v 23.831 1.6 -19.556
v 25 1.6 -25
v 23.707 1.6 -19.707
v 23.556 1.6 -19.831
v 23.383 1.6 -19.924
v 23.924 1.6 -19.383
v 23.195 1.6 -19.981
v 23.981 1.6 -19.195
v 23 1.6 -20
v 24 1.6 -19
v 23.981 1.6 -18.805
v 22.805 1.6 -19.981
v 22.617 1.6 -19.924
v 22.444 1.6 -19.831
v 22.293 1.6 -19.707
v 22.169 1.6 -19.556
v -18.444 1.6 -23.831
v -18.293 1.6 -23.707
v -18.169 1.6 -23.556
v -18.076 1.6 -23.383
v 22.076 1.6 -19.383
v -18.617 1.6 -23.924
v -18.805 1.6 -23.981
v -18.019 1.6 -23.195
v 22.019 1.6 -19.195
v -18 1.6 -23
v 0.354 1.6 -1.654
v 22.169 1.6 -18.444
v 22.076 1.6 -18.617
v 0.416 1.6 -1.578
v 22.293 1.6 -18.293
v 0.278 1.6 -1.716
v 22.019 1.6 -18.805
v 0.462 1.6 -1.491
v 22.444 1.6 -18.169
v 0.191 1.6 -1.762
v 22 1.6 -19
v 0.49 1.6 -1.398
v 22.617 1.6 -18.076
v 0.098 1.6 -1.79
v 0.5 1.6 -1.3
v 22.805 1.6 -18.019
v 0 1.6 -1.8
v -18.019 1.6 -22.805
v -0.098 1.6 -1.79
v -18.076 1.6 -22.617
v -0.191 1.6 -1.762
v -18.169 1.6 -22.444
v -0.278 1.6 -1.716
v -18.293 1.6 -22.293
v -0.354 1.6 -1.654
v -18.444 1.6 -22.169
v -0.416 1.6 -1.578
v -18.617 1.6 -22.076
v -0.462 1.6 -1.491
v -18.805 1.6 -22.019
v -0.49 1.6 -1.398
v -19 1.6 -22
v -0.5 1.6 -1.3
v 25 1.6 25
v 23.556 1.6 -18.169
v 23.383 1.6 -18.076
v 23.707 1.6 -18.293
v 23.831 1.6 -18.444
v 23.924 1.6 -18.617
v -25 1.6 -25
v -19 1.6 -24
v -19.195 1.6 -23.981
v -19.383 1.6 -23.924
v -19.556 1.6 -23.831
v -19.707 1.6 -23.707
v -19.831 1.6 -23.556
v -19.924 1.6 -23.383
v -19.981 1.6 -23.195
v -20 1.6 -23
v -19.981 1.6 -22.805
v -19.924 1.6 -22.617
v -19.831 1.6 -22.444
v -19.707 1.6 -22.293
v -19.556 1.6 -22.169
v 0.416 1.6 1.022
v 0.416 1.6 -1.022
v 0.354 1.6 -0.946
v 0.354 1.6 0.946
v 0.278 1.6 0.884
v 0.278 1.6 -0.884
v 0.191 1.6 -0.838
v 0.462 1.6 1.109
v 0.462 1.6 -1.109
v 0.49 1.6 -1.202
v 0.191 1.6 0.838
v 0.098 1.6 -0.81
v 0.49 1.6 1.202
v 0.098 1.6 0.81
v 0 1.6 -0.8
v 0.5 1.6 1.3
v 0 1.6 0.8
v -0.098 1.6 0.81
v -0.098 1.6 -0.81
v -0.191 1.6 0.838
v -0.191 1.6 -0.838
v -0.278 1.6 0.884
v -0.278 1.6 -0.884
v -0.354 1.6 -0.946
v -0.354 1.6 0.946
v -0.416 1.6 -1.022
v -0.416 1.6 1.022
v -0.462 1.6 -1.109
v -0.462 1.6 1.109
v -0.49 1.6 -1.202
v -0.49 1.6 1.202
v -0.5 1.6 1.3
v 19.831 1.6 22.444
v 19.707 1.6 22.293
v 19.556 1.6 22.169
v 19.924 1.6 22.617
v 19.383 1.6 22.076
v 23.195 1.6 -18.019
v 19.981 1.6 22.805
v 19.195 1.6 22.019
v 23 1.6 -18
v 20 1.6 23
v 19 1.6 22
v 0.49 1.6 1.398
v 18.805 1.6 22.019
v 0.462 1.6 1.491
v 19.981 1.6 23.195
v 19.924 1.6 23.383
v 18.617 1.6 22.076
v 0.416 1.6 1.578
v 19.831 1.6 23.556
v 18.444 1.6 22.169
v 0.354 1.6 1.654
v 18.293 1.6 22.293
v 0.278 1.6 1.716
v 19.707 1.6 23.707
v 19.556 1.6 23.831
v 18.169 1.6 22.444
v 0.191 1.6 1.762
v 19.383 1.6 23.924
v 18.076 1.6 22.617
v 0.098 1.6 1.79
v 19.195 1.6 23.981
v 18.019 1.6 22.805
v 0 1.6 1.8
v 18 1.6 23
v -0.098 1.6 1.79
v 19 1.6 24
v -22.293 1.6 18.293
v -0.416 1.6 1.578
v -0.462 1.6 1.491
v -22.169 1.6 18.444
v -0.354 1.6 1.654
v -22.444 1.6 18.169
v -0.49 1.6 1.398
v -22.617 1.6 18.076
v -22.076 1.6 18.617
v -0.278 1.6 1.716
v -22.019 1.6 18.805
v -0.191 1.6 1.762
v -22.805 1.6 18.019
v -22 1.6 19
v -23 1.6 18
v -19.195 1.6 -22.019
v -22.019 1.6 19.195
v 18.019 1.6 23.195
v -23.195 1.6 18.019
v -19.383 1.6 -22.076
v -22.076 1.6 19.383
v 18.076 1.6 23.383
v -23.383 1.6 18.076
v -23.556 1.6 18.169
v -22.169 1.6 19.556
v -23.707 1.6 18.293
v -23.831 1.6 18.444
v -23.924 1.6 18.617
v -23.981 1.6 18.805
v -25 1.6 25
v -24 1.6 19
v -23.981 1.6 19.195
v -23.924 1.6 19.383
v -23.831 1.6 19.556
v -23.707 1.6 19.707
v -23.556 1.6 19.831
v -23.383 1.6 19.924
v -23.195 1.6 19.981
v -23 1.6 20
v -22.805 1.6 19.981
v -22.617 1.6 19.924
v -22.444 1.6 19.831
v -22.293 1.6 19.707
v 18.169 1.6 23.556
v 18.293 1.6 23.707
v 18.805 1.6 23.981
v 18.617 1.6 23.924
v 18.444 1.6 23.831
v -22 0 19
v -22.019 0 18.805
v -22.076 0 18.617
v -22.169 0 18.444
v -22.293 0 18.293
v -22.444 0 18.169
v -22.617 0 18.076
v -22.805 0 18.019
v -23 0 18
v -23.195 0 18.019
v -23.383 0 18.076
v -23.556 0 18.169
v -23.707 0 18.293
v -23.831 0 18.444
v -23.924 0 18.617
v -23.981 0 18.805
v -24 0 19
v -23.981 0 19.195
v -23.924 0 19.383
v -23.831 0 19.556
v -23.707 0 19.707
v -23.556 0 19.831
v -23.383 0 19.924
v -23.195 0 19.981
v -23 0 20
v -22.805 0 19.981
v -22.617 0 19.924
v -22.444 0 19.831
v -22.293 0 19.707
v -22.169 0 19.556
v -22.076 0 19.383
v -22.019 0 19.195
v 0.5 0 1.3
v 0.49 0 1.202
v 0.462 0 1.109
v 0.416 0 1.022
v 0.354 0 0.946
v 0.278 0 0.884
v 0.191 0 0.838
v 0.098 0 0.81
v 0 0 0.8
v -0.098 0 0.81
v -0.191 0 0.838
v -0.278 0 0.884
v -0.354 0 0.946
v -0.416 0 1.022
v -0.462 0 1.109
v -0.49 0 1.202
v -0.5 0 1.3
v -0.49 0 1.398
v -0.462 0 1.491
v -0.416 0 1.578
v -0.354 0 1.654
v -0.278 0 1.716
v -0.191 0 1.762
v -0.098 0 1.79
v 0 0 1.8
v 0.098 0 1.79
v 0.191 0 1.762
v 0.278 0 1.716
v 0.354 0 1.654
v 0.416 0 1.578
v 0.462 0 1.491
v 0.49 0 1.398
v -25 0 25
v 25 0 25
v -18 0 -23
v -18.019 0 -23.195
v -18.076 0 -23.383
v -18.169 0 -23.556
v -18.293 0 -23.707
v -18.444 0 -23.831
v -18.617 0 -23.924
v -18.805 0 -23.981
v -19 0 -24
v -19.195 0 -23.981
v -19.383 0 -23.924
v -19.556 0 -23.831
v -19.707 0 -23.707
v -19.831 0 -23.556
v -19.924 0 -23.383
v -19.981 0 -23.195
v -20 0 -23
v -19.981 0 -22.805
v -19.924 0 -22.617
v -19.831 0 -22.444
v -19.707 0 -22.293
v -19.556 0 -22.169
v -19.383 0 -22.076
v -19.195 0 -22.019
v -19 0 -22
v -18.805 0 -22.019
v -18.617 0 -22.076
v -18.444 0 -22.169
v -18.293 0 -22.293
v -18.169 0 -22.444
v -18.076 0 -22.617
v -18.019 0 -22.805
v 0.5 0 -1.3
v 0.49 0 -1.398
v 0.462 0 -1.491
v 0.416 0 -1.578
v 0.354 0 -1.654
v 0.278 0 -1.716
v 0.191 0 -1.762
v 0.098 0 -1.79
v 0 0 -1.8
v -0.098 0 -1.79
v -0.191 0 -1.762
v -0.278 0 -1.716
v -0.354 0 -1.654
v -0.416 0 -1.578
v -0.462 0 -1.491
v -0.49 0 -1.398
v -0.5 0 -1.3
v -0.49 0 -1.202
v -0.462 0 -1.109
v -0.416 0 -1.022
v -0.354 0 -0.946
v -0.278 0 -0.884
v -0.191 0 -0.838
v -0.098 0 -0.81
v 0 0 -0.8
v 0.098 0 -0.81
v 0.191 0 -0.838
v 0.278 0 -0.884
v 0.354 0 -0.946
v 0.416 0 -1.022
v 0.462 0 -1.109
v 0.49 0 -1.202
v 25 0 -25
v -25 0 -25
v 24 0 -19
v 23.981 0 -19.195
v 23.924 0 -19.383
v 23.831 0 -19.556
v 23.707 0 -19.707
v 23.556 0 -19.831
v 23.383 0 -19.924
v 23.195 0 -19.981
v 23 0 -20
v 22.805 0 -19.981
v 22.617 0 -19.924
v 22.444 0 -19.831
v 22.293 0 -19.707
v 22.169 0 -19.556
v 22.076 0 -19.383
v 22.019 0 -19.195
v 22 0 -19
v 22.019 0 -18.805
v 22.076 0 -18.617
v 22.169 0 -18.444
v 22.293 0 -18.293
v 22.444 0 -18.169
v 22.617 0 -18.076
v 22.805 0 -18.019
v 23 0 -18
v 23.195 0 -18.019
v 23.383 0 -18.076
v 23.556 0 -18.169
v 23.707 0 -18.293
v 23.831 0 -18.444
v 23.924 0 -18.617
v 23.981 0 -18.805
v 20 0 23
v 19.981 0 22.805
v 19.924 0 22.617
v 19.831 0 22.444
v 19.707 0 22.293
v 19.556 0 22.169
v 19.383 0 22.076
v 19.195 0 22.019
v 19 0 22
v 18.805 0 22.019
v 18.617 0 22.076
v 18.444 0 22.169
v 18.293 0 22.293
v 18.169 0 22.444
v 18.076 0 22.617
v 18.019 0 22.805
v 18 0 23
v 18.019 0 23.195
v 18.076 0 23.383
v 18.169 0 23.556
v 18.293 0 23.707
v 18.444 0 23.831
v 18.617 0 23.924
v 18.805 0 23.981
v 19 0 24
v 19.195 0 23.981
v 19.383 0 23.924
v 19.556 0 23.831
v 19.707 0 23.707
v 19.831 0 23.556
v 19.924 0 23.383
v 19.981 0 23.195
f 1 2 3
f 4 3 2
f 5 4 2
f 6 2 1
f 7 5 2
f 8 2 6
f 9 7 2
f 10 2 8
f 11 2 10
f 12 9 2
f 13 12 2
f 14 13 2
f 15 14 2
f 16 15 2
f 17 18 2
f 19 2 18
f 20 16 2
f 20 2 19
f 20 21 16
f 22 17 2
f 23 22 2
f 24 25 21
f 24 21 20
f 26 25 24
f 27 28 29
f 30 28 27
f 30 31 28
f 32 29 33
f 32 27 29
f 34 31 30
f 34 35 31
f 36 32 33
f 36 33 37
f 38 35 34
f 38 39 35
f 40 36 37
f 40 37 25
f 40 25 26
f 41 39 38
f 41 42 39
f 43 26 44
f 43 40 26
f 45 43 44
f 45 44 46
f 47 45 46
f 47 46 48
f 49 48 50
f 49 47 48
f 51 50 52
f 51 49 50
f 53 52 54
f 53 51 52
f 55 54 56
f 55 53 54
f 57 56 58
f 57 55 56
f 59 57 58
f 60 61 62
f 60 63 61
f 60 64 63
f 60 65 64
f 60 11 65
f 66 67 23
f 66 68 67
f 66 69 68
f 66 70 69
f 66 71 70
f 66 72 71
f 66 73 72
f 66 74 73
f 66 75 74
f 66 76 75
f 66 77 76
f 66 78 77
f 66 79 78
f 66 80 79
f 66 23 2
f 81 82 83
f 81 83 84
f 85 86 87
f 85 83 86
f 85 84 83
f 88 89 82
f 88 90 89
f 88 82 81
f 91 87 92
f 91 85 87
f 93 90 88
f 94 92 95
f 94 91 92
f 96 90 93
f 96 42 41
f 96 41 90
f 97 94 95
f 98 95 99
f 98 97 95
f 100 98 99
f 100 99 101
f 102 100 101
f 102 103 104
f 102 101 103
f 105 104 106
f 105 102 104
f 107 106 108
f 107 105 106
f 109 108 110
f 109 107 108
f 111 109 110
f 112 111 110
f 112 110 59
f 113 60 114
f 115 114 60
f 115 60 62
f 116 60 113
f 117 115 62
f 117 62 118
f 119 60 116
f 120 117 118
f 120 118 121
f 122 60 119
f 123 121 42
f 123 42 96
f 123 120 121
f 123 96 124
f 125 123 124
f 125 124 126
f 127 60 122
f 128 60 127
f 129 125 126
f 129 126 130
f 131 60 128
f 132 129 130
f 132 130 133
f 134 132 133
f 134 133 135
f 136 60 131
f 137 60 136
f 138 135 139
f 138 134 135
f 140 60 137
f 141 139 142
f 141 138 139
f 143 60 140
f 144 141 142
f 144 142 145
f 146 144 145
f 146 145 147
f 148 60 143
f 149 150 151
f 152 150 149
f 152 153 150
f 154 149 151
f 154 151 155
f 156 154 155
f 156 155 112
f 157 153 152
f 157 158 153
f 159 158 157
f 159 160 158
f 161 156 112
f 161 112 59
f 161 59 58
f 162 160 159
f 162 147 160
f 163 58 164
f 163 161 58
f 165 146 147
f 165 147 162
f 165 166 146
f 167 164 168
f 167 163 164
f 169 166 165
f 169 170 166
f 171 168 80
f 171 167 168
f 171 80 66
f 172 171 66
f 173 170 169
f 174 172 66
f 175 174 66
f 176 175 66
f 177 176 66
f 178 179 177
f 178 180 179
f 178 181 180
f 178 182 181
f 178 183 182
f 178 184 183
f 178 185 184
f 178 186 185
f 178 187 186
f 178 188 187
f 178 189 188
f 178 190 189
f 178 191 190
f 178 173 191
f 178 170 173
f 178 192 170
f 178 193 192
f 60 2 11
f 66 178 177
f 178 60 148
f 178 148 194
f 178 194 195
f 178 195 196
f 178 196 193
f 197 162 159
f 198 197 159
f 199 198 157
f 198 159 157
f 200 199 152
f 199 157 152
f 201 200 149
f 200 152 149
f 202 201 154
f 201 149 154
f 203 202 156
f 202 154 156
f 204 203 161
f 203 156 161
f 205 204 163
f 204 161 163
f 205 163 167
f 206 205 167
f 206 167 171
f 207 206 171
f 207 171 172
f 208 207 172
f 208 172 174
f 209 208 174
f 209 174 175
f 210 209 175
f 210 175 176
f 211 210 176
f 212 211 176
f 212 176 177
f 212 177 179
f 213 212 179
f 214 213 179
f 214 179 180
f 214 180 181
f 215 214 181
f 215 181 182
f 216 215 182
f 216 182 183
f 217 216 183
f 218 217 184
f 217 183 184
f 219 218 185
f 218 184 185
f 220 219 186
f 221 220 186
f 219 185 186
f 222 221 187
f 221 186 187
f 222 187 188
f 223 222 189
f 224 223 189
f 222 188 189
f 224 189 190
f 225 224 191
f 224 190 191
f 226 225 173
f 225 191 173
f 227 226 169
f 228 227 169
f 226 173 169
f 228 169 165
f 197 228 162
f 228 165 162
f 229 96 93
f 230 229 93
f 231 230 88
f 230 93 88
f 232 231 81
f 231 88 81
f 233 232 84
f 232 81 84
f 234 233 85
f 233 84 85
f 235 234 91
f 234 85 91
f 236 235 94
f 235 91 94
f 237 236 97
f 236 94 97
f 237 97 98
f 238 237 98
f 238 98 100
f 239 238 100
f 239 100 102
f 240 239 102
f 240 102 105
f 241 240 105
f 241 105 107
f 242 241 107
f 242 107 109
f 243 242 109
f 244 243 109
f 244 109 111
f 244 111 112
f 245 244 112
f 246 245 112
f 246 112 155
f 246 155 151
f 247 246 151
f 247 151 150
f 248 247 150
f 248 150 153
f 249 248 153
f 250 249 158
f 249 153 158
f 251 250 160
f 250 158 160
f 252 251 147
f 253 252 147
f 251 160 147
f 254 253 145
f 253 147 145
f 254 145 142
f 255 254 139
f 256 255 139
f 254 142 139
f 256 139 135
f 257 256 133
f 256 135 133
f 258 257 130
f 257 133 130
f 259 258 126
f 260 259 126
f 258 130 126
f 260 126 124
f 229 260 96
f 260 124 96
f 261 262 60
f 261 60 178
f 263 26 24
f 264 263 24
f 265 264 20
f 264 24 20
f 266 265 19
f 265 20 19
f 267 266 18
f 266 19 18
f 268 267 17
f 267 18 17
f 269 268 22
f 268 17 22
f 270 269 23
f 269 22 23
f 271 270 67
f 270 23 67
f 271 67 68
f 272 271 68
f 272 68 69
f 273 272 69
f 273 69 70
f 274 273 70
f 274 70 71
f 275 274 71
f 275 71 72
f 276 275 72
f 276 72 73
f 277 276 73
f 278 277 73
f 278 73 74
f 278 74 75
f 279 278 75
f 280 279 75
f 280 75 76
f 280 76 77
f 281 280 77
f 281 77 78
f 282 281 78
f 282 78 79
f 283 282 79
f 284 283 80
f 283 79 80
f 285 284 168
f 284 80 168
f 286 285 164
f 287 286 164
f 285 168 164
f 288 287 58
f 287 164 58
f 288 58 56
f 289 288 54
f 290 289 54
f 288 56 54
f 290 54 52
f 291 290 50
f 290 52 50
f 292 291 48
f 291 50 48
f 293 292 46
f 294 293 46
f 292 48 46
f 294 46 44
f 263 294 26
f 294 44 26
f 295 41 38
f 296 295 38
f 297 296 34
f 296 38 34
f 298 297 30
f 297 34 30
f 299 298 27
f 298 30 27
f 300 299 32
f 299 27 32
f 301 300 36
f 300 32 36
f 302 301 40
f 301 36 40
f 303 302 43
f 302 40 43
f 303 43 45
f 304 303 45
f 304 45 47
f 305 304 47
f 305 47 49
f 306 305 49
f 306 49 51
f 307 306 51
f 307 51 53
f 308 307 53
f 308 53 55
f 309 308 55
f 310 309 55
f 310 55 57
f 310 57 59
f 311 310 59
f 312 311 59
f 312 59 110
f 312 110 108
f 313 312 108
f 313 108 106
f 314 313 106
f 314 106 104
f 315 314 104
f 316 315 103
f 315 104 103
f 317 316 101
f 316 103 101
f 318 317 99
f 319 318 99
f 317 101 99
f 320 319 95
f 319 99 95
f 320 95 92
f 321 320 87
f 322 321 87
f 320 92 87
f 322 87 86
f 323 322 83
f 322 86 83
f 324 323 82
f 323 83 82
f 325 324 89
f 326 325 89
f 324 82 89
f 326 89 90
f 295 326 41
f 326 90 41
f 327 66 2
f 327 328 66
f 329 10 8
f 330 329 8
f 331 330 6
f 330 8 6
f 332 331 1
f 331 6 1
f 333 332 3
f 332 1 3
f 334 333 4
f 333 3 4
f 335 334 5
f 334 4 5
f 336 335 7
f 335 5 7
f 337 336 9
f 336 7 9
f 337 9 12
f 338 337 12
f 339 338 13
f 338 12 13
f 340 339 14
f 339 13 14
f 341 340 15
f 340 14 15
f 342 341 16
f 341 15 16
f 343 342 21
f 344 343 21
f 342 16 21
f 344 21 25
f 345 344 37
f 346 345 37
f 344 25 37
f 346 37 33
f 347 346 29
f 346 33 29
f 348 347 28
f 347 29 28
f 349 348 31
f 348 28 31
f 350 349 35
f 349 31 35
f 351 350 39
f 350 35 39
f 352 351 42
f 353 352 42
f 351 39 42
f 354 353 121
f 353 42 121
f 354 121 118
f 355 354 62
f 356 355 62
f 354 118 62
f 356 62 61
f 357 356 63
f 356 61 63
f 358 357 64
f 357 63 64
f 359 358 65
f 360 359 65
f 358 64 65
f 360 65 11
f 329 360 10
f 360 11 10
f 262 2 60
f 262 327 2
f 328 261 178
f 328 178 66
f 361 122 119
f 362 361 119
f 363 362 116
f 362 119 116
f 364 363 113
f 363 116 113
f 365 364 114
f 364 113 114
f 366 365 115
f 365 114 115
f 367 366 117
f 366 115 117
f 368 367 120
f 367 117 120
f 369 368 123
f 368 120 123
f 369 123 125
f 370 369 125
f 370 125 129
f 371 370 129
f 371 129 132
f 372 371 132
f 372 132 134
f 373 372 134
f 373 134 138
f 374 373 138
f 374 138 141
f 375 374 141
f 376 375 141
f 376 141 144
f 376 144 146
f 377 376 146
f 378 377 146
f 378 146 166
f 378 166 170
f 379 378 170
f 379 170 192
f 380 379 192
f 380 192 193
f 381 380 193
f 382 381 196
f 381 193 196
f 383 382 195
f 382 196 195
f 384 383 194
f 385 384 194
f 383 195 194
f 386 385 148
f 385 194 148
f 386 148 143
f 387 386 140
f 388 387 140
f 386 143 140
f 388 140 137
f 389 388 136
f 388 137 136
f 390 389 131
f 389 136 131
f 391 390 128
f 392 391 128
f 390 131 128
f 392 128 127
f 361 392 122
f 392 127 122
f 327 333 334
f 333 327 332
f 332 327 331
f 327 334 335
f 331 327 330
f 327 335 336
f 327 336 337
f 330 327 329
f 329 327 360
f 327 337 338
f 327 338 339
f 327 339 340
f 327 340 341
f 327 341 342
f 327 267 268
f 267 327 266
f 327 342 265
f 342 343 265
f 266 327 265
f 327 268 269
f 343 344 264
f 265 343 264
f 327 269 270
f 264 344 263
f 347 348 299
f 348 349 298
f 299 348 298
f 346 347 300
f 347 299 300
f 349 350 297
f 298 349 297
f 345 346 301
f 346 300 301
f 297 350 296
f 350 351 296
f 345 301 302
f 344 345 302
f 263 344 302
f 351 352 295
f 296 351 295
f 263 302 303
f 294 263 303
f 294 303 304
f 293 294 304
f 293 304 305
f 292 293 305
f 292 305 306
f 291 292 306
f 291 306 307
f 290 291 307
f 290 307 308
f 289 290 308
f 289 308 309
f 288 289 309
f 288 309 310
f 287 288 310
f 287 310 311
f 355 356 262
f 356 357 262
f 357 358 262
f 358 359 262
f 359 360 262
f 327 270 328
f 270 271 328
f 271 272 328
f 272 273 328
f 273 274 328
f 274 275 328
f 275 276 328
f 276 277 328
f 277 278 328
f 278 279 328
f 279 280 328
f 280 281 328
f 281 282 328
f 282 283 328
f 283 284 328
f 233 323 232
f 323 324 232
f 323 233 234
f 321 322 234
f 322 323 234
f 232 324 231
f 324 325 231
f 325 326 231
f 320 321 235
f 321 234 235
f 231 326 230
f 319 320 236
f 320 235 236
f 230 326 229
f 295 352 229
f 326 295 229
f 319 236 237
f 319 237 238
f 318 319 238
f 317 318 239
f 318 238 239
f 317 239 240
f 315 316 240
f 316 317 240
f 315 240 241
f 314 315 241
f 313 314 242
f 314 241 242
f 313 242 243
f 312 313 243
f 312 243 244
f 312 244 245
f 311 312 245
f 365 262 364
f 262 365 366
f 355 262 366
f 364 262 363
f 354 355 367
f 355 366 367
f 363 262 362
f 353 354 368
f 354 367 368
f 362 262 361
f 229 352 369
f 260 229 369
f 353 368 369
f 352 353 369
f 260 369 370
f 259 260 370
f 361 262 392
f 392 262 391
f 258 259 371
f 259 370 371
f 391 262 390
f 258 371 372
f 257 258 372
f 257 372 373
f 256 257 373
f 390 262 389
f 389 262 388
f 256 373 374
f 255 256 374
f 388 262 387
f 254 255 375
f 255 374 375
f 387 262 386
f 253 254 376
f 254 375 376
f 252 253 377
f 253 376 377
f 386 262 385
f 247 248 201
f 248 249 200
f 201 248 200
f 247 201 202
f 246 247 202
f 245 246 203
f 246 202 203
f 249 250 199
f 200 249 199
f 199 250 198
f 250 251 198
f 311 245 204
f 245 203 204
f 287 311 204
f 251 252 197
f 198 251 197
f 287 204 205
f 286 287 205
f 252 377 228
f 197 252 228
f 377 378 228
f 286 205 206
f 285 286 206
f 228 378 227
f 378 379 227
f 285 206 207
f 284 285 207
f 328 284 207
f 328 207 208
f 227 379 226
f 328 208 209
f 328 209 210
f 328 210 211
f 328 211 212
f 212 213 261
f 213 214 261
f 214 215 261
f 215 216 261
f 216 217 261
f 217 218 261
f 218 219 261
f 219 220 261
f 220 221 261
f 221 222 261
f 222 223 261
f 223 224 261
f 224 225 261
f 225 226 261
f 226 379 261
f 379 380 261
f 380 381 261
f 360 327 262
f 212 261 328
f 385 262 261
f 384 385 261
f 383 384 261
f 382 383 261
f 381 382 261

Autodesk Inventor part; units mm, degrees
ref_plane "YZ Plane" through (0, 0, 0) normal (1, 0, 0) x (0, 1, 0)
ref_plane "XZ Plane" through (0, 0, 0) normal (0, 1, 0) x (-1, 0, 0)
ref_plane "XY Plane" through (0, 0, 0) normal (0, 0, 1) x (1, 0, 0)
sketch "Sketch1" plane through (0, 0, 0) normal (0, 1, 0) x (-1, 0, 0)
  line L0 (-25, 25) -> (25, 25)
  line L1 (25, 25) -> (25, -25)
  line L2 (25, -25) -> (-25, -25)
  line L3 (-25, -25) -> (-25, 25)
  line L4 (-25, 25) -> (25, -25) construction
  line L5 (25, 25) -> (-25, -25) construction
  point P0 (0, 0)
  dimension "d0" = 50
  dimension "d1" = 50
extrude "Extrusion1" add sketch "Sketch1" along normal blind 1.6
sketch "Sketch2" plane through (0, 1.6, 0) normal (0, 1, 0) x (1, 0, 0)
  circle A0 centre (-23, -19) radius 1
  line L0 (-25, 25) -> (-25, -25) projected
  line L1 (-25, -25) -> (25, -25) projected
  circle A1 centre (19, -23) radius 1
  circle A2 centre (23, 19) radius 1
  circle A3 centre (-19, 23) radius 1
  line L2 (25, -25) -> (25, 25) projected
  line L3 (25, 25) -> (-25, 25) projected
  point P0 (0, 0)
  dimension "d4" = 2
  dimension "d5" = 2
  dimension "d6" = 6
  dimension "d7" = 2
  dimension "d8" = 2
  dimension "d9" = 2
  dimension "d10" = 2
  dimension "d11" = 6
  dimension "d12" = 6
  dimension "d13" = 2
  dimension "d14" = 2
  dimension "d15" = 6
extrude "Extrusion2" cut sketch "Sketch2" against normal blind 2 contours A0 | A1 | A2 | A3
sketch "Sketch3" plane through (0, 1.6, 0) normal (0, 1, 0) x (1, 0, 0)
  circle A0 centre (0, 1.3) radius 0.5
  circle A1 centre (0, -1.3) radius 0.5
  point P0 (0, 0)
  dimension "d18" = 1
  dimension "d19" = 1
  dimension "d20" = 1.3
  dimension "d21" = 1.3
extrude "Extrusion3" cut sketch "Sketch3" against normal blind 2
equation "\"d16\" = d14"
properties part number "Solar Panel PCB" material "ABS Plastic"
